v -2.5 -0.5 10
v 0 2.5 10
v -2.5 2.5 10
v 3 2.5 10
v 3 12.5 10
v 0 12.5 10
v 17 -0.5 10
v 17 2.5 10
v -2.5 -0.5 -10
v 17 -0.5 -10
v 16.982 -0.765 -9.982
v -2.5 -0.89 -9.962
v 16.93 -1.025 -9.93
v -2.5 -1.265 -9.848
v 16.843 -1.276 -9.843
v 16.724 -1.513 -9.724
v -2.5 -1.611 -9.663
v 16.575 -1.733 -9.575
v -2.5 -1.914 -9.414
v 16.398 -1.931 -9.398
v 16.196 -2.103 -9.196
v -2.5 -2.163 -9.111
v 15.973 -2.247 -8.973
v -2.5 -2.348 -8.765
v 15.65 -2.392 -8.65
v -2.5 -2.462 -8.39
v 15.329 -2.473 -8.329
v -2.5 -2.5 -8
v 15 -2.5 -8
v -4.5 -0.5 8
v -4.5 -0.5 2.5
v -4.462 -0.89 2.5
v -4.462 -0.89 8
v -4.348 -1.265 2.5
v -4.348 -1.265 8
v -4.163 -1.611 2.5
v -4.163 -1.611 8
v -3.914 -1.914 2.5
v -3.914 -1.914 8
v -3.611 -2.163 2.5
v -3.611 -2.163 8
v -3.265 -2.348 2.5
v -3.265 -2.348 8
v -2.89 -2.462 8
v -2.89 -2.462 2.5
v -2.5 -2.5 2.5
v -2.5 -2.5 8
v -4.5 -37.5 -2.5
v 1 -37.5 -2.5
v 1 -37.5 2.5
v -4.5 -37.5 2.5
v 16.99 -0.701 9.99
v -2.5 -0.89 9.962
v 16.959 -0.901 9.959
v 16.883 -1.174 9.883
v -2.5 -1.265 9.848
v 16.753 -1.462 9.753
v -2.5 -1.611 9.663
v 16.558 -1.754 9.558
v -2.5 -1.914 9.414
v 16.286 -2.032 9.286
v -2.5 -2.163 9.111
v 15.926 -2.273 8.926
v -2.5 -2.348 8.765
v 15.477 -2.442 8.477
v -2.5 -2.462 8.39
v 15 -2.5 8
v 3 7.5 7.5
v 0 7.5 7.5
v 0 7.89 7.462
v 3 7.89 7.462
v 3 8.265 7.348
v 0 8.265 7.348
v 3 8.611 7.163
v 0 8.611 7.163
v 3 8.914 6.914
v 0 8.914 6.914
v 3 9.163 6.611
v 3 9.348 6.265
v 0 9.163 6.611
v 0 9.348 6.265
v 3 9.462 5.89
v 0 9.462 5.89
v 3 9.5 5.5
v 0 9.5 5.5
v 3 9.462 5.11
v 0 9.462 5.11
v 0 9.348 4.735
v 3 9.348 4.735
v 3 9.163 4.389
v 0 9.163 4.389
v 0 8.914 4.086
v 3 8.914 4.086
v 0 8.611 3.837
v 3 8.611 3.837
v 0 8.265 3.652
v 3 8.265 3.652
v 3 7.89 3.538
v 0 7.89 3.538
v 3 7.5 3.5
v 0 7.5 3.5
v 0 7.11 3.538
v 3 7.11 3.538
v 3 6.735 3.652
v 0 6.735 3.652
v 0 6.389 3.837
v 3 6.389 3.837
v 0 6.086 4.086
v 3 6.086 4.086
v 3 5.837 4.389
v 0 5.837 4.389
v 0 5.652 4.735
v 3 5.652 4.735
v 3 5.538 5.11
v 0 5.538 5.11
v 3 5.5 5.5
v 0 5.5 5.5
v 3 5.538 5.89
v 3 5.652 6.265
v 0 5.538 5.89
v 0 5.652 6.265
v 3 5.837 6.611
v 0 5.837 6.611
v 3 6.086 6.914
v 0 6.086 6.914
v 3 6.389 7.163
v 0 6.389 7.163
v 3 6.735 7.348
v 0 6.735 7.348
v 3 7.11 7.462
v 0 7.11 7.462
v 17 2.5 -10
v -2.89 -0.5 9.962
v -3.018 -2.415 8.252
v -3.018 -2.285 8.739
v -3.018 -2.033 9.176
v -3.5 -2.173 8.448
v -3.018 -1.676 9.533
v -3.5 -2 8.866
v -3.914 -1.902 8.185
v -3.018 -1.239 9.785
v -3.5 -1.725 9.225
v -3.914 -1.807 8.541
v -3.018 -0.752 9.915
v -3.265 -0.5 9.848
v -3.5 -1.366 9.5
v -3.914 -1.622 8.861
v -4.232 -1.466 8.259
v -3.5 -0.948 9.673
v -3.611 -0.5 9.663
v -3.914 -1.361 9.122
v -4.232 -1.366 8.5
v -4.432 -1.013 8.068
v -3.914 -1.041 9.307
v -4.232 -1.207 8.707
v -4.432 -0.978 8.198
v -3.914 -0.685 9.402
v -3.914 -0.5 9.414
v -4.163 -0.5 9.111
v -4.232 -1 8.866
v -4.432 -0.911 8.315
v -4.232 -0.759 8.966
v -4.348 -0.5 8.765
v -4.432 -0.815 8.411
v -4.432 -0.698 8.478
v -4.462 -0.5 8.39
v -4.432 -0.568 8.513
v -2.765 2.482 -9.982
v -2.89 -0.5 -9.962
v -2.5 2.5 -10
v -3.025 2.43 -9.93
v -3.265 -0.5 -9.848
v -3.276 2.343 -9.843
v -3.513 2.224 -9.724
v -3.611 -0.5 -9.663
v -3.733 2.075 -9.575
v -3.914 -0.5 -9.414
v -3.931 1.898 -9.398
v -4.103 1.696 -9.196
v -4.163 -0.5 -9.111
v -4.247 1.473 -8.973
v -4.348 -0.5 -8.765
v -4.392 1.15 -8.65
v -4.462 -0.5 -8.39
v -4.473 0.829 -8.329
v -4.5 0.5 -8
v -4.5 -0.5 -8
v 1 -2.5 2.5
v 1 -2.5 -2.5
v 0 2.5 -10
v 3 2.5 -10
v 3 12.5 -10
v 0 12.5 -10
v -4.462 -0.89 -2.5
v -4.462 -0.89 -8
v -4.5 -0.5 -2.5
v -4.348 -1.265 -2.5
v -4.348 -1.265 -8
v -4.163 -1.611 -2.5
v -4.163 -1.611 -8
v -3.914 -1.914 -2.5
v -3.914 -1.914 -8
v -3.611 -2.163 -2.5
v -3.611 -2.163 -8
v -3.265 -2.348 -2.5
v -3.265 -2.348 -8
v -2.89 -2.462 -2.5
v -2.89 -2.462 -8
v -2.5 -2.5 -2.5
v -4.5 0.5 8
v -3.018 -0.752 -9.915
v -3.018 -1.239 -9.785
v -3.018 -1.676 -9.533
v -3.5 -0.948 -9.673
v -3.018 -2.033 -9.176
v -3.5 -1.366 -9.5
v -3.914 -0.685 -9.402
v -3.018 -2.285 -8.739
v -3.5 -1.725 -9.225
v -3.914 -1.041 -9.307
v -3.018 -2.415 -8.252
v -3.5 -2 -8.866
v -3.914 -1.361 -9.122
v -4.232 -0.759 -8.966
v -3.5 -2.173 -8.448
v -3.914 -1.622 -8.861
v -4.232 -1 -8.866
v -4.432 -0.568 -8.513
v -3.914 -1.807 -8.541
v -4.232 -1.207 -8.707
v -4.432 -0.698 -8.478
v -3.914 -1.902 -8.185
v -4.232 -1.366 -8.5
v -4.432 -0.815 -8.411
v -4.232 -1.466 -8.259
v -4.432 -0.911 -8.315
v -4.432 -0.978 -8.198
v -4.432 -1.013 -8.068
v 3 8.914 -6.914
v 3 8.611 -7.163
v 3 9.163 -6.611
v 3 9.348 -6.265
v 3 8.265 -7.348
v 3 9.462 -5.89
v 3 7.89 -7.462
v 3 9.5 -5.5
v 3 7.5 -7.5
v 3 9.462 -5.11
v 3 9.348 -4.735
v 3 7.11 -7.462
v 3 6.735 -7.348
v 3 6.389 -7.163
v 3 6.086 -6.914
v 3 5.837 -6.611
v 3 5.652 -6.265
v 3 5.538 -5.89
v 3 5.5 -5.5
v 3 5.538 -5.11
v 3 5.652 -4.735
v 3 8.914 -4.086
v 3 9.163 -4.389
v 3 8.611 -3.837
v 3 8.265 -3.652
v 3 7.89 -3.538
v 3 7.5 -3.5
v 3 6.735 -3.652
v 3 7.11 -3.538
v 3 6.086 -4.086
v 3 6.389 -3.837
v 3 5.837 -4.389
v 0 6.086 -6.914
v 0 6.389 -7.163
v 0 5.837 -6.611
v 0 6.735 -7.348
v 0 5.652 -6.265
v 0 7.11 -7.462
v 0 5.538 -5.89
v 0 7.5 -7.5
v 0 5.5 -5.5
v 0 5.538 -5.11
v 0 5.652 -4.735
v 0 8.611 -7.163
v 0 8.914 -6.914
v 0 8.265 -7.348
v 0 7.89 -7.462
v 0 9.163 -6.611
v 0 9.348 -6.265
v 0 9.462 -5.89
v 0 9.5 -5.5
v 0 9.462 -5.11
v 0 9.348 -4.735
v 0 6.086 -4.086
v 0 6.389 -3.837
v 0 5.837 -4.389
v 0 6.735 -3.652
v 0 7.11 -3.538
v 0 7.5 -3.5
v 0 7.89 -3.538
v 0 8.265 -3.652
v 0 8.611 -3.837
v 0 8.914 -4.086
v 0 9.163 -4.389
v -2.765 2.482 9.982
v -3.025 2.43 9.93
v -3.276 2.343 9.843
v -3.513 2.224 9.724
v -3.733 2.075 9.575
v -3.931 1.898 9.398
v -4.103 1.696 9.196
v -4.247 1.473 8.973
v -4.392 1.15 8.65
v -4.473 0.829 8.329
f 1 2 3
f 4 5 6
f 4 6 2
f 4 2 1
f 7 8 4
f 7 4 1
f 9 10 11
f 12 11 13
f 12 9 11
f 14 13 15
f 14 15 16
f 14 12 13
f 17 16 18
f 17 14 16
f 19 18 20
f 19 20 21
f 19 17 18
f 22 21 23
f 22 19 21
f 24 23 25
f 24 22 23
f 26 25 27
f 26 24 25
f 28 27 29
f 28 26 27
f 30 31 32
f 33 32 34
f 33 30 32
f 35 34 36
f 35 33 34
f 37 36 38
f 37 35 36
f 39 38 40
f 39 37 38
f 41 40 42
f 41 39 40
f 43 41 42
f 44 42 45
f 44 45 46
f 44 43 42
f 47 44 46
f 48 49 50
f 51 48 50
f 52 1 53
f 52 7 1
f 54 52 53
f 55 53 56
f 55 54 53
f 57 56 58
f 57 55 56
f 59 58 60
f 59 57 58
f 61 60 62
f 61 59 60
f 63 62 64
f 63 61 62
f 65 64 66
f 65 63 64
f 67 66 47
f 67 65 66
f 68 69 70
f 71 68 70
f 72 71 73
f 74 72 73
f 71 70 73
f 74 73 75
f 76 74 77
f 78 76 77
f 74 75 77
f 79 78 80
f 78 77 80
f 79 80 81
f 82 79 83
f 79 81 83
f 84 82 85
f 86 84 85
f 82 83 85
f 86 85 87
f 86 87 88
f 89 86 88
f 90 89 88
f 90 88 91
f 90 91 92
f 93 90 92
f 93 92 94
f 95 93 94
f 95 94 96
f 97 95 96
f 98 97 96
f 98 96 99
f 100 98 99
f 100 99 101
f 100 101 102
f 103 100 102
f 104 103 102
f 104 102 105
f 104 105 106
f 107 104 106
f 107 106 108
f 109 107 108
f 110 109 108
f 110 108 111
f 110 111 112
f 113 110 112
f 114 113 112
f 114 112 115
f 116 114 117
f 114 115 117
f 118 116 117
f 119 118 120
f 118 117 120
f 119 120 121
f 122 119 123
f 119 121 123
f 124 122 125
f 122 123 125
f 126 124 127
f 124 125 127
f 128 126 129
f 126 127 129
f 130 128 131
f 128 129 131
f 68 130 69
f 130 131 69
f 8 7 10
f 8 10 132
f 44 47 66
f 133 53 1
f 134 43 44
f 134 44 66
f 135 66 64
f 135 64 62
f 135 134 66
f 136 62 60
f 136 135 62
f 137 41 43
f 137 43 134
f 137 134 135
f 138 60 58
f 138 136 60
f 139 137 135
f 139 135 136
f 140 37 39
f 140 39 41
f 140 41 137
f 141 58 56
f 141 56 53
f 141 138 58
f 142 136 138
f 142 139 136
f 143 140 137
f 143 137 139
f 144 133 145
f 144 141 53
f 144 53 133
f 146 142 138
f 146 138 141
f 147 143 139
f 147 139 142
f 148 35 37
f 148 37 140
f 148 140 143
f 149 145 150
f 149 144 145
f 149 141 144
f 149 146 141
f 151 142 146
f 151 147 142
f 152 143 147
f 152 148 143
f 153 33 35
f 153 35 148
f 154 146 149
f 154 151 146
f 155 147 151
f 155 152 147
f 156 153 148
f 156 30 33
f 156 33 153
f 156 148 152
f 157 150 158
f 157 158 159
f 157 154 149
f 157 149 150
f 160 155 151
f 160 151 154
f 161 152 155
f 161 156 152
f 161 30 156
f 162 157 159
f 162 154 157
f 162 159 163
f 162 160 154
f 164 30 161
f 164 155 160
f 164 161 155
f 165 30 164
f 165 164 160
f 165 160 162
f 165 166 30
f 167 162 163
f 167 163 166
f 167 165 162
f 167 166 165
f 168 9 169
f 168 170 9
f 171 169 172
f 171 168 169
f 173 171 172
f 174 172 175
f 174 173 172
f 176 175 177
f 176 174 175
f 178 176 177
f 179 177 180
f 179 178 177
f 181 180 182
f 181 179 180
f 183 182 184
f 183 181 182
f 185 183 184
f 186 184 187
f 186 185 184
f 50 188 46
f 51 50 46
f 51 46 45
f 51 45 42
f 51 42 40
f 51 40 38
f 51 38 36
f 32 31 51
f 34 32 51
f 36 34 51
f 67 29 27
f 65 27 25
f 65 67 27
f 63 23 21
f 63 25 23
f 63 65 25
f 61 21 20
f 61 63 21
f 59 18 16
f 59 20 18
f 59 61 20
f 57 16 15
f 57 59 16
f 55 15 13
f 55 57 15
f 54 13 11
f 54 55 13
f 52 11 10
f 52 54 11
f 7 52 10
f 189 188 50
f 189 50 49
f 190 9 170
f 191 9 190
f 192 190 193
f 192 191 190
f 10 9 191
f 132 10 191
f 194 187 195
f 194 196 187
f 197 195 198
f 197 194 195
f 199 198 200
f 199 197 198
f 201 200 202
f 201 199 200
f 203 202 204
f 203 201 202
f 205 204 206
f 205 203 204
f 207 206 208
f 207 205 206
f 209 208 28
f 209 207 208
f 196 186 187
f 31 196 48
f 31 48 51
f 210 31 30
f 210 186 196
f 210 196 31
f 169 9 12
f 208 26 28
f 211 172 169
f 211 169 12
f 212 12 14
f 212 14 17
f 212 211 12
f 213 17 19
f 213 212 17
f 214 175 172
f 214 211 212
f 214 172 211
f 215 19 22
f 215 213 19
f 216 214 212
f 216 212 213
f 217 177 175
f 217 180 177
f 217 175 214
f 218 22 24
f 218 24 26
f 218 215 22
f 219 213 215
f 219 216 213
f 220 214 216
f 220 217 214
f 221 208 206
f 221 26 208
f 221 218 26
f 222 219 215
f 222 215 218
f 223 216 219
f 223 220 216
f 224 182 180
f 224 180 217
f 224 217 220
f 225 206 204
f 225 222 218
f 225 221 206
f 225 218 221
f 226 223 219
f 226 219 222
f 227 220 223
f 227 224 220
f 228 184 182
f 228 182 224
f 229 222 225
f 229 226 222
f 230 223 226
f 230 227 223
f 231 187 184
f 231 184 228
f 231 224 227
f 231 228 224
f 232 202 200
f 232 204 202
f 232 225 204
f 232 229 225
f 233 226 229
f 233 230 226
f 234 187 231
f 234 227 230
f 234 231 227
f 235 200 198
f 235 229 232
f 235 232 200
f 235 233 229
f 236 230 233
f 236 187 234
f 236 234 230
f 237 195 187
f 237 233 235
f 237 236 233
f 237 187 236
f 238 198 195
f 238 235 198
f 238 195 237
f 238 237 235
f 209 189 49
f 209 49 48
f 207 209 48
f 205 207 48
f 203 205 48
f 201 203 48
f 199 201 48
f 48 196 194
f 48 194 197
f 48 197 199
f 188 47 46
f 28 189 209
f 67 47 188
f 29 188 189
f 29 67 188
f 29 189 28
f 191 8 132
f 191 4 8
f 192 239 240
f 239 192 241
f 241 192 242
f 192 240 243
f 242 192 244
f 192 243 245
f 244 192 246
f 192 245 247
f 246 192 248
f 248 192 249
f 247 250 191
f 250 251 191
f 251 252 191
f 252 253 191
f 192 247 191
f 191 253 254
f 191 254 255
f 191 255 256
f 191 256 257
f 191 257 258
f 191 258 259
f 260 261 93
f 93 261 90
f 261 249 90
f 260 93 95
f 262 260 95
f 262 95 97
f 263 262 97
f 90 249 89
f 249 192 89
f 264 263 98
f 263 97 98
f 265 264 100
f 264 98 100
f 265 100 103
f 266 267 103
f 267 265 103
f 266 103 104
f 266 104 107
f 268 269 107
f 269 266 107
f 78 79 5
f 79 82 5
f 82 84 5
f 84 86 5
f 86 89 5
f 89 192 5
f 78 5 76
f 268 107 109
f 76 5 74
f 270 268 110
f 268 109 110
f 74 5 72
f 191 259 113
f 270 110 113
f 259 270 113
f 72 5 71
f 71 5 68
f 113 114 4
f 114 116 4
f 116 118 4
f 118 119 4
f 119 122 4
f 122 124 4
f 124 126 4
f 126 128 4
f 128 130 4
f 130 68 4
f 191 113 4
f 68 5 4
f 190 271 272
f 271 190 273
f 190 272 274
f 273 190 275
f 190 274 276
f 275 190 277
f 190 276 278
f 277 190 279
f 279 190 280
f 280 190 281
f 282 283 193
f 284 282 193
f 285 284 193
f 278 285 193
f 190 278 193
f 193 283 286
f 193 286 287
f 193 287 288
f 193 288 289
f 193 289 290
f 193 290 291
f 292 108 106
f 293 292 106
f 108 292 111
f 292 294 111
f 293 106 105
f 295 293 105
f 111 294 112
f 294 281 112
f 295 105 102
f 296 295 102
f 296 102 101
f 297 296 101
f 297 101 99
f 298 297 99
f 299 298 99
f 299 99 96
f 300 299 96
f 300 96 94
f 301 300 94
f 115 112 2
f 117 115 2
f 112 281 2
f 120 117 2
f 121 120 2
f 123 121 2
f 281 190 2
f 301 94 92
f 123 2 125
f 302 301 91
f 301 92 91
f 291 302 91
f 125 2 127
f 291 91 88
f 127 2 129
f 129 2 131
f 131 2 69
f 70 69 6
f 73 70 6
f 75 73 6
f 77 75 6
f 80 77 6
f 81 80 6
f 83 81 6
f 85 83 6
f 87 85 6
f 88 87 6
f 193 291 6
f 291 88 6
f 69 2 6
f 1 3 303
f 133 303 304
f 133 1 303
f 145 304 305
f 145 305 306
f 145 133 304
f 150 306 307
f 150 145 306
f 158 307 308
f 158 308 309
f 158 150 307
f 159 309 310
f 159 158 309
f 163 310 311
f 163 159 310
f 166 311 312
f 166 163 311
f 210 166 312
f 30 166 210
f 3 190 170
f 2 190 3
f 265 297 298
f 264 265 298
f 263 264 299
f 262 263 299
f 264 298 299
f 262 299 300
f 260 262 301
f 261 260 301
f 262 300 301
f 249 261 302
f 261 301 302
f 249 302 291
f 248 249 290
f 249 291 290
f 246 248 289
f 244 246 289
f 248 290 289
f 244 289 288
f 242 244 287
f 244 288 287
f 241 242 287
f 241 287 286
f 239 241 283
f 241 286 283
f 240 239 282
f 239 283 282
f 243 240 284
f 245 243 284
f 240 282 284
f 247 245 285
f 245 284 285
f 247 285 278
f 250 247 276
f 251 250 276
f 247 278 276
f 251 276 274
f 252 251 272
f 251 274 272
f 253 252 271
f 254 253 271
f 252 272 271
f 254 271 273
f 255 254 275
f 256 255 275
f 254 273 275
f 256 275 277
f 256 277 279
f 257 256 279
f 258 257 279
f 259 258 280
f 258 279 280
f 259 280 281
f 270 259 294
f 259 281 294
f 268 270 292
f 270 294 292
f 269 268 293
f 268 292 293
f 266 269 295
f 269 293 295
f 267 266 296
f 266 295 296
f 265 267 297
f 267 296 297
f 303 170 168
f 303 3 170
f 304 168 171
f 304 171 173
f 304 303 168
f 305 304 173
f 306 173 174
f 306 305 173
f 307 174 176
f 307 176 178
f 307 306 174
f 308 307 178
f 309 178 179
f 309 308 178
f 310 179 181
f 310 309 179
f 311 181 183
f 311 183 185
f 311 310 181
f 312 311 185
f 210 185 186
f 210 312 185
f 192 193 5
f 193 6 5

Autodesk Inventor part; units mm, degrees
ref_plane "YZ Plane" through (0, 0, 0) normal (1, 0, 0) x (0, 1, 0)
ref_plane "XZ Plane" through (0, 0, 0) normal (0, 1, 0) x (-1, 0, 0)
ref_plane "XY Plane" through (0, 0, 0) normal (0, 0, 1) x (1, 0, 0)
sketch "Sketch1" plane through (0, 0, 0) normal (1, 0, 0) x (0, 1, 0)
  line L0 (-2.5, 10) -> (2.5, 10)
  line L1 (2.5, 10) -> (2.5, -10)
  line L2 (2.5, -10) -> (-2.5, -10)
  line L3 (-2.5, -10) -> (-2.5, 10)
  line L4 (-2.5, 10) -> (2.5, -10) construction
  line L5 (2.5, 10) -> (-2.5, -10) construction
  point P0 (0, 0)
  dimension "d0" = 5
  dimension "d1" = 20
extrude "Extrusion1" add sketch "Sketch1" along normal blind 17
sketch "Sketch3" plane through (0, -2.5, 10) normal (0, 0, 1) x (1, 0, 0)
  line L0 (3, 5) -> (0, 5)
  line L1 (0, 5) -> (0, 15)
  line L2 (0, 15) -> (3, 15)
  line L3 (3, 15) -> (3, 5)
  point P0 (0, 2.5)
  dimension "d8" = 3
  dimension "d9" = 10
extrude "Extrusion3" add sketch "Sketch3" against normal up to surface (20 mm away)
sketch "Sketch4" plane through (0, 0, 0) normal (-1, 0, 0) x (0, 0, 1)
  circle A0 centre (-121.4441, 7.5) radius 2 projected
  circle A1 centre (-132.4441, 7.5) radius 2 projected
  point P0 (0, 0)
extrude "Extrusion4" cut sketch "Sketch4" against normal through all
sketch "Sketch5" plane through (0, 0, 0) normal (-1, 0, 0) x (0, 0, 1)
  line L0 (-2.5, -37.5) -> (-2.5, -2.5) projected
  line L1 (-10, -2.5) -> (10, -2.5) projected
  line L2 (2.5, -2.5) -> (2.5, -37.5) projected
  line L3 (2.5, -37.5) -> (-2.5, -37.5) projected
  point P0 (0, 0)
extrude "Extrusion5" add sketch "Sketch5" against normal blind 5
sketch "Sketch6" plane through (0, 0, 0) normal (-1, 0, 0) x (0, 0, 1)
  circle A0 centre (-5.5, 7.5) radius 2 projected
  circle A1 centre (5.5, 7.5) radius 2 projected
  point P0 (0, 0)
extrude "Extrusion6" cut sketch "Sketch6" against normal blind 10
ref_plane "Work Plane1" through (0, -2.5, -10) normal (0, -1, 0) x (1, 0, 0)
split_face "Split1"
sketch "Sketch7" plane through (0, -2.5, 2.5) normal (-1, 0, 0) x (0, 0, 1)
  line L0 (-12.5, 5) -> (7.5, 5) projected
  line L1 (-5, 0) -> (0, 0) projected
  line L2 (7.5, 0) -> (0, 0) projected
  line L3 (7.5, 15) -> (7.5, 0) projected
  line L4 (7.5, 15) -> (-12.5, 15) projected
  line L5 (-12.5, 0) -> (-12.5, 15) projected
  line L6 (-5, 0) -> (-12.5, 0) projected
  circle A0 centre (3, 10) radius 2 projected
  circle A1 centre (-8, 10) radius 2 projected
  line L7 (-5, 0) -> (0, 0) projected
  line L8 (-5, 0) -> (-5, -35) projected
  line L9 (-5, -35) -> (0, -35) projected
  line L10 (0, -35) -> (0, 0) projected
  point P0 (-2.5, 2.5)
extrude "Extrusion7" add sketch "Sketch7" along normal blind 4 contours L0 L3 L2 L1 L6 L5 | L1 L10 L9 L8
sketch "Sketch8" plane through (5, 0, 0) normal (1, 0, 0) x (0, 0, -1)
  line L0 (-2.5, -2.5) -> (-2.5, -37.5) projected
  line L1 (-2.5, -37.5) -> (2.5, -37.5) projected
  line L2 (2.5, -37.5) -> (2.5, -2.5) projected
  line L3 (-2.5, -2.5) -> (2.5, -2.5) projected
  point P0 (0, 0)
extrude "Extrusion8" cut sketch "Sketch8" against normal blind 4
move faces "Move1" translate (-0.5, 0, 0) faces at (-4, -14.1667, 0.8333)
fillet "Fillet3" radius 2 6 edges at (6.25, -2.5, -10) (17, -2.5, 0) (6.25, -2.5, 10) (-4.5, 0, 10) (-4.5, 2.5, 0) (-4.5, 0, -10)
fillet "Fillet4" radius 2 4 edges at (-4.5, -2.5, 5.25) (-3.9142, -1.9142, 9.4142) (-4.5, -2.5, -5.25) (-3.9142, -1.9142, -9.4142)
sketch "Sketch11" plane through (15, -2.5, -8) normal (0, -1, 0) x (1, 0, 0)
  point P0 (-15, 8)
sketch "Sketch2" plane through (17, 0, 0) normal (1, 0, 0) x (0, 0, -1)
  line L0 (-2.4746, -2.5) -> (2.5254, -2.5)
  line L1 (2.5254, -2.5) -> (2.5254, -37.5)
  line L2 (2.5254, -37.5) -> (-2.4746, -37.5)
  line L3 (-2.4746, -37.5) -> (-2.4746, -2.5)
  line L4 (-10, -2.5) -> (10, -2.5) projected
  line L5 (2.5254, -2.5) -> (2.5254, 0)
  line L6 (-2.4746, -2.5) -> (-2.4746, -0.5)
  line L7 (10, -0.5) -> (-10, -0.5) projected
  line L8 (2.5254, 0) -> (-2.2155, 0)
  line L9 (-2.4746, -0.5) -> (-2.4746, 0)
  line L10 (-2.4746, 0) -> (-2.1408, 0)
  point P0 (0, 0)
  dimension "d4" = 5
  dimension "d5" = 35
sketch "Sketch12" plane through (15, -2.5, -8) normal (0, -1, 0) x (1, 0, 0)
  point P0 (-15, 8)
properties part number "reverse_finger"
